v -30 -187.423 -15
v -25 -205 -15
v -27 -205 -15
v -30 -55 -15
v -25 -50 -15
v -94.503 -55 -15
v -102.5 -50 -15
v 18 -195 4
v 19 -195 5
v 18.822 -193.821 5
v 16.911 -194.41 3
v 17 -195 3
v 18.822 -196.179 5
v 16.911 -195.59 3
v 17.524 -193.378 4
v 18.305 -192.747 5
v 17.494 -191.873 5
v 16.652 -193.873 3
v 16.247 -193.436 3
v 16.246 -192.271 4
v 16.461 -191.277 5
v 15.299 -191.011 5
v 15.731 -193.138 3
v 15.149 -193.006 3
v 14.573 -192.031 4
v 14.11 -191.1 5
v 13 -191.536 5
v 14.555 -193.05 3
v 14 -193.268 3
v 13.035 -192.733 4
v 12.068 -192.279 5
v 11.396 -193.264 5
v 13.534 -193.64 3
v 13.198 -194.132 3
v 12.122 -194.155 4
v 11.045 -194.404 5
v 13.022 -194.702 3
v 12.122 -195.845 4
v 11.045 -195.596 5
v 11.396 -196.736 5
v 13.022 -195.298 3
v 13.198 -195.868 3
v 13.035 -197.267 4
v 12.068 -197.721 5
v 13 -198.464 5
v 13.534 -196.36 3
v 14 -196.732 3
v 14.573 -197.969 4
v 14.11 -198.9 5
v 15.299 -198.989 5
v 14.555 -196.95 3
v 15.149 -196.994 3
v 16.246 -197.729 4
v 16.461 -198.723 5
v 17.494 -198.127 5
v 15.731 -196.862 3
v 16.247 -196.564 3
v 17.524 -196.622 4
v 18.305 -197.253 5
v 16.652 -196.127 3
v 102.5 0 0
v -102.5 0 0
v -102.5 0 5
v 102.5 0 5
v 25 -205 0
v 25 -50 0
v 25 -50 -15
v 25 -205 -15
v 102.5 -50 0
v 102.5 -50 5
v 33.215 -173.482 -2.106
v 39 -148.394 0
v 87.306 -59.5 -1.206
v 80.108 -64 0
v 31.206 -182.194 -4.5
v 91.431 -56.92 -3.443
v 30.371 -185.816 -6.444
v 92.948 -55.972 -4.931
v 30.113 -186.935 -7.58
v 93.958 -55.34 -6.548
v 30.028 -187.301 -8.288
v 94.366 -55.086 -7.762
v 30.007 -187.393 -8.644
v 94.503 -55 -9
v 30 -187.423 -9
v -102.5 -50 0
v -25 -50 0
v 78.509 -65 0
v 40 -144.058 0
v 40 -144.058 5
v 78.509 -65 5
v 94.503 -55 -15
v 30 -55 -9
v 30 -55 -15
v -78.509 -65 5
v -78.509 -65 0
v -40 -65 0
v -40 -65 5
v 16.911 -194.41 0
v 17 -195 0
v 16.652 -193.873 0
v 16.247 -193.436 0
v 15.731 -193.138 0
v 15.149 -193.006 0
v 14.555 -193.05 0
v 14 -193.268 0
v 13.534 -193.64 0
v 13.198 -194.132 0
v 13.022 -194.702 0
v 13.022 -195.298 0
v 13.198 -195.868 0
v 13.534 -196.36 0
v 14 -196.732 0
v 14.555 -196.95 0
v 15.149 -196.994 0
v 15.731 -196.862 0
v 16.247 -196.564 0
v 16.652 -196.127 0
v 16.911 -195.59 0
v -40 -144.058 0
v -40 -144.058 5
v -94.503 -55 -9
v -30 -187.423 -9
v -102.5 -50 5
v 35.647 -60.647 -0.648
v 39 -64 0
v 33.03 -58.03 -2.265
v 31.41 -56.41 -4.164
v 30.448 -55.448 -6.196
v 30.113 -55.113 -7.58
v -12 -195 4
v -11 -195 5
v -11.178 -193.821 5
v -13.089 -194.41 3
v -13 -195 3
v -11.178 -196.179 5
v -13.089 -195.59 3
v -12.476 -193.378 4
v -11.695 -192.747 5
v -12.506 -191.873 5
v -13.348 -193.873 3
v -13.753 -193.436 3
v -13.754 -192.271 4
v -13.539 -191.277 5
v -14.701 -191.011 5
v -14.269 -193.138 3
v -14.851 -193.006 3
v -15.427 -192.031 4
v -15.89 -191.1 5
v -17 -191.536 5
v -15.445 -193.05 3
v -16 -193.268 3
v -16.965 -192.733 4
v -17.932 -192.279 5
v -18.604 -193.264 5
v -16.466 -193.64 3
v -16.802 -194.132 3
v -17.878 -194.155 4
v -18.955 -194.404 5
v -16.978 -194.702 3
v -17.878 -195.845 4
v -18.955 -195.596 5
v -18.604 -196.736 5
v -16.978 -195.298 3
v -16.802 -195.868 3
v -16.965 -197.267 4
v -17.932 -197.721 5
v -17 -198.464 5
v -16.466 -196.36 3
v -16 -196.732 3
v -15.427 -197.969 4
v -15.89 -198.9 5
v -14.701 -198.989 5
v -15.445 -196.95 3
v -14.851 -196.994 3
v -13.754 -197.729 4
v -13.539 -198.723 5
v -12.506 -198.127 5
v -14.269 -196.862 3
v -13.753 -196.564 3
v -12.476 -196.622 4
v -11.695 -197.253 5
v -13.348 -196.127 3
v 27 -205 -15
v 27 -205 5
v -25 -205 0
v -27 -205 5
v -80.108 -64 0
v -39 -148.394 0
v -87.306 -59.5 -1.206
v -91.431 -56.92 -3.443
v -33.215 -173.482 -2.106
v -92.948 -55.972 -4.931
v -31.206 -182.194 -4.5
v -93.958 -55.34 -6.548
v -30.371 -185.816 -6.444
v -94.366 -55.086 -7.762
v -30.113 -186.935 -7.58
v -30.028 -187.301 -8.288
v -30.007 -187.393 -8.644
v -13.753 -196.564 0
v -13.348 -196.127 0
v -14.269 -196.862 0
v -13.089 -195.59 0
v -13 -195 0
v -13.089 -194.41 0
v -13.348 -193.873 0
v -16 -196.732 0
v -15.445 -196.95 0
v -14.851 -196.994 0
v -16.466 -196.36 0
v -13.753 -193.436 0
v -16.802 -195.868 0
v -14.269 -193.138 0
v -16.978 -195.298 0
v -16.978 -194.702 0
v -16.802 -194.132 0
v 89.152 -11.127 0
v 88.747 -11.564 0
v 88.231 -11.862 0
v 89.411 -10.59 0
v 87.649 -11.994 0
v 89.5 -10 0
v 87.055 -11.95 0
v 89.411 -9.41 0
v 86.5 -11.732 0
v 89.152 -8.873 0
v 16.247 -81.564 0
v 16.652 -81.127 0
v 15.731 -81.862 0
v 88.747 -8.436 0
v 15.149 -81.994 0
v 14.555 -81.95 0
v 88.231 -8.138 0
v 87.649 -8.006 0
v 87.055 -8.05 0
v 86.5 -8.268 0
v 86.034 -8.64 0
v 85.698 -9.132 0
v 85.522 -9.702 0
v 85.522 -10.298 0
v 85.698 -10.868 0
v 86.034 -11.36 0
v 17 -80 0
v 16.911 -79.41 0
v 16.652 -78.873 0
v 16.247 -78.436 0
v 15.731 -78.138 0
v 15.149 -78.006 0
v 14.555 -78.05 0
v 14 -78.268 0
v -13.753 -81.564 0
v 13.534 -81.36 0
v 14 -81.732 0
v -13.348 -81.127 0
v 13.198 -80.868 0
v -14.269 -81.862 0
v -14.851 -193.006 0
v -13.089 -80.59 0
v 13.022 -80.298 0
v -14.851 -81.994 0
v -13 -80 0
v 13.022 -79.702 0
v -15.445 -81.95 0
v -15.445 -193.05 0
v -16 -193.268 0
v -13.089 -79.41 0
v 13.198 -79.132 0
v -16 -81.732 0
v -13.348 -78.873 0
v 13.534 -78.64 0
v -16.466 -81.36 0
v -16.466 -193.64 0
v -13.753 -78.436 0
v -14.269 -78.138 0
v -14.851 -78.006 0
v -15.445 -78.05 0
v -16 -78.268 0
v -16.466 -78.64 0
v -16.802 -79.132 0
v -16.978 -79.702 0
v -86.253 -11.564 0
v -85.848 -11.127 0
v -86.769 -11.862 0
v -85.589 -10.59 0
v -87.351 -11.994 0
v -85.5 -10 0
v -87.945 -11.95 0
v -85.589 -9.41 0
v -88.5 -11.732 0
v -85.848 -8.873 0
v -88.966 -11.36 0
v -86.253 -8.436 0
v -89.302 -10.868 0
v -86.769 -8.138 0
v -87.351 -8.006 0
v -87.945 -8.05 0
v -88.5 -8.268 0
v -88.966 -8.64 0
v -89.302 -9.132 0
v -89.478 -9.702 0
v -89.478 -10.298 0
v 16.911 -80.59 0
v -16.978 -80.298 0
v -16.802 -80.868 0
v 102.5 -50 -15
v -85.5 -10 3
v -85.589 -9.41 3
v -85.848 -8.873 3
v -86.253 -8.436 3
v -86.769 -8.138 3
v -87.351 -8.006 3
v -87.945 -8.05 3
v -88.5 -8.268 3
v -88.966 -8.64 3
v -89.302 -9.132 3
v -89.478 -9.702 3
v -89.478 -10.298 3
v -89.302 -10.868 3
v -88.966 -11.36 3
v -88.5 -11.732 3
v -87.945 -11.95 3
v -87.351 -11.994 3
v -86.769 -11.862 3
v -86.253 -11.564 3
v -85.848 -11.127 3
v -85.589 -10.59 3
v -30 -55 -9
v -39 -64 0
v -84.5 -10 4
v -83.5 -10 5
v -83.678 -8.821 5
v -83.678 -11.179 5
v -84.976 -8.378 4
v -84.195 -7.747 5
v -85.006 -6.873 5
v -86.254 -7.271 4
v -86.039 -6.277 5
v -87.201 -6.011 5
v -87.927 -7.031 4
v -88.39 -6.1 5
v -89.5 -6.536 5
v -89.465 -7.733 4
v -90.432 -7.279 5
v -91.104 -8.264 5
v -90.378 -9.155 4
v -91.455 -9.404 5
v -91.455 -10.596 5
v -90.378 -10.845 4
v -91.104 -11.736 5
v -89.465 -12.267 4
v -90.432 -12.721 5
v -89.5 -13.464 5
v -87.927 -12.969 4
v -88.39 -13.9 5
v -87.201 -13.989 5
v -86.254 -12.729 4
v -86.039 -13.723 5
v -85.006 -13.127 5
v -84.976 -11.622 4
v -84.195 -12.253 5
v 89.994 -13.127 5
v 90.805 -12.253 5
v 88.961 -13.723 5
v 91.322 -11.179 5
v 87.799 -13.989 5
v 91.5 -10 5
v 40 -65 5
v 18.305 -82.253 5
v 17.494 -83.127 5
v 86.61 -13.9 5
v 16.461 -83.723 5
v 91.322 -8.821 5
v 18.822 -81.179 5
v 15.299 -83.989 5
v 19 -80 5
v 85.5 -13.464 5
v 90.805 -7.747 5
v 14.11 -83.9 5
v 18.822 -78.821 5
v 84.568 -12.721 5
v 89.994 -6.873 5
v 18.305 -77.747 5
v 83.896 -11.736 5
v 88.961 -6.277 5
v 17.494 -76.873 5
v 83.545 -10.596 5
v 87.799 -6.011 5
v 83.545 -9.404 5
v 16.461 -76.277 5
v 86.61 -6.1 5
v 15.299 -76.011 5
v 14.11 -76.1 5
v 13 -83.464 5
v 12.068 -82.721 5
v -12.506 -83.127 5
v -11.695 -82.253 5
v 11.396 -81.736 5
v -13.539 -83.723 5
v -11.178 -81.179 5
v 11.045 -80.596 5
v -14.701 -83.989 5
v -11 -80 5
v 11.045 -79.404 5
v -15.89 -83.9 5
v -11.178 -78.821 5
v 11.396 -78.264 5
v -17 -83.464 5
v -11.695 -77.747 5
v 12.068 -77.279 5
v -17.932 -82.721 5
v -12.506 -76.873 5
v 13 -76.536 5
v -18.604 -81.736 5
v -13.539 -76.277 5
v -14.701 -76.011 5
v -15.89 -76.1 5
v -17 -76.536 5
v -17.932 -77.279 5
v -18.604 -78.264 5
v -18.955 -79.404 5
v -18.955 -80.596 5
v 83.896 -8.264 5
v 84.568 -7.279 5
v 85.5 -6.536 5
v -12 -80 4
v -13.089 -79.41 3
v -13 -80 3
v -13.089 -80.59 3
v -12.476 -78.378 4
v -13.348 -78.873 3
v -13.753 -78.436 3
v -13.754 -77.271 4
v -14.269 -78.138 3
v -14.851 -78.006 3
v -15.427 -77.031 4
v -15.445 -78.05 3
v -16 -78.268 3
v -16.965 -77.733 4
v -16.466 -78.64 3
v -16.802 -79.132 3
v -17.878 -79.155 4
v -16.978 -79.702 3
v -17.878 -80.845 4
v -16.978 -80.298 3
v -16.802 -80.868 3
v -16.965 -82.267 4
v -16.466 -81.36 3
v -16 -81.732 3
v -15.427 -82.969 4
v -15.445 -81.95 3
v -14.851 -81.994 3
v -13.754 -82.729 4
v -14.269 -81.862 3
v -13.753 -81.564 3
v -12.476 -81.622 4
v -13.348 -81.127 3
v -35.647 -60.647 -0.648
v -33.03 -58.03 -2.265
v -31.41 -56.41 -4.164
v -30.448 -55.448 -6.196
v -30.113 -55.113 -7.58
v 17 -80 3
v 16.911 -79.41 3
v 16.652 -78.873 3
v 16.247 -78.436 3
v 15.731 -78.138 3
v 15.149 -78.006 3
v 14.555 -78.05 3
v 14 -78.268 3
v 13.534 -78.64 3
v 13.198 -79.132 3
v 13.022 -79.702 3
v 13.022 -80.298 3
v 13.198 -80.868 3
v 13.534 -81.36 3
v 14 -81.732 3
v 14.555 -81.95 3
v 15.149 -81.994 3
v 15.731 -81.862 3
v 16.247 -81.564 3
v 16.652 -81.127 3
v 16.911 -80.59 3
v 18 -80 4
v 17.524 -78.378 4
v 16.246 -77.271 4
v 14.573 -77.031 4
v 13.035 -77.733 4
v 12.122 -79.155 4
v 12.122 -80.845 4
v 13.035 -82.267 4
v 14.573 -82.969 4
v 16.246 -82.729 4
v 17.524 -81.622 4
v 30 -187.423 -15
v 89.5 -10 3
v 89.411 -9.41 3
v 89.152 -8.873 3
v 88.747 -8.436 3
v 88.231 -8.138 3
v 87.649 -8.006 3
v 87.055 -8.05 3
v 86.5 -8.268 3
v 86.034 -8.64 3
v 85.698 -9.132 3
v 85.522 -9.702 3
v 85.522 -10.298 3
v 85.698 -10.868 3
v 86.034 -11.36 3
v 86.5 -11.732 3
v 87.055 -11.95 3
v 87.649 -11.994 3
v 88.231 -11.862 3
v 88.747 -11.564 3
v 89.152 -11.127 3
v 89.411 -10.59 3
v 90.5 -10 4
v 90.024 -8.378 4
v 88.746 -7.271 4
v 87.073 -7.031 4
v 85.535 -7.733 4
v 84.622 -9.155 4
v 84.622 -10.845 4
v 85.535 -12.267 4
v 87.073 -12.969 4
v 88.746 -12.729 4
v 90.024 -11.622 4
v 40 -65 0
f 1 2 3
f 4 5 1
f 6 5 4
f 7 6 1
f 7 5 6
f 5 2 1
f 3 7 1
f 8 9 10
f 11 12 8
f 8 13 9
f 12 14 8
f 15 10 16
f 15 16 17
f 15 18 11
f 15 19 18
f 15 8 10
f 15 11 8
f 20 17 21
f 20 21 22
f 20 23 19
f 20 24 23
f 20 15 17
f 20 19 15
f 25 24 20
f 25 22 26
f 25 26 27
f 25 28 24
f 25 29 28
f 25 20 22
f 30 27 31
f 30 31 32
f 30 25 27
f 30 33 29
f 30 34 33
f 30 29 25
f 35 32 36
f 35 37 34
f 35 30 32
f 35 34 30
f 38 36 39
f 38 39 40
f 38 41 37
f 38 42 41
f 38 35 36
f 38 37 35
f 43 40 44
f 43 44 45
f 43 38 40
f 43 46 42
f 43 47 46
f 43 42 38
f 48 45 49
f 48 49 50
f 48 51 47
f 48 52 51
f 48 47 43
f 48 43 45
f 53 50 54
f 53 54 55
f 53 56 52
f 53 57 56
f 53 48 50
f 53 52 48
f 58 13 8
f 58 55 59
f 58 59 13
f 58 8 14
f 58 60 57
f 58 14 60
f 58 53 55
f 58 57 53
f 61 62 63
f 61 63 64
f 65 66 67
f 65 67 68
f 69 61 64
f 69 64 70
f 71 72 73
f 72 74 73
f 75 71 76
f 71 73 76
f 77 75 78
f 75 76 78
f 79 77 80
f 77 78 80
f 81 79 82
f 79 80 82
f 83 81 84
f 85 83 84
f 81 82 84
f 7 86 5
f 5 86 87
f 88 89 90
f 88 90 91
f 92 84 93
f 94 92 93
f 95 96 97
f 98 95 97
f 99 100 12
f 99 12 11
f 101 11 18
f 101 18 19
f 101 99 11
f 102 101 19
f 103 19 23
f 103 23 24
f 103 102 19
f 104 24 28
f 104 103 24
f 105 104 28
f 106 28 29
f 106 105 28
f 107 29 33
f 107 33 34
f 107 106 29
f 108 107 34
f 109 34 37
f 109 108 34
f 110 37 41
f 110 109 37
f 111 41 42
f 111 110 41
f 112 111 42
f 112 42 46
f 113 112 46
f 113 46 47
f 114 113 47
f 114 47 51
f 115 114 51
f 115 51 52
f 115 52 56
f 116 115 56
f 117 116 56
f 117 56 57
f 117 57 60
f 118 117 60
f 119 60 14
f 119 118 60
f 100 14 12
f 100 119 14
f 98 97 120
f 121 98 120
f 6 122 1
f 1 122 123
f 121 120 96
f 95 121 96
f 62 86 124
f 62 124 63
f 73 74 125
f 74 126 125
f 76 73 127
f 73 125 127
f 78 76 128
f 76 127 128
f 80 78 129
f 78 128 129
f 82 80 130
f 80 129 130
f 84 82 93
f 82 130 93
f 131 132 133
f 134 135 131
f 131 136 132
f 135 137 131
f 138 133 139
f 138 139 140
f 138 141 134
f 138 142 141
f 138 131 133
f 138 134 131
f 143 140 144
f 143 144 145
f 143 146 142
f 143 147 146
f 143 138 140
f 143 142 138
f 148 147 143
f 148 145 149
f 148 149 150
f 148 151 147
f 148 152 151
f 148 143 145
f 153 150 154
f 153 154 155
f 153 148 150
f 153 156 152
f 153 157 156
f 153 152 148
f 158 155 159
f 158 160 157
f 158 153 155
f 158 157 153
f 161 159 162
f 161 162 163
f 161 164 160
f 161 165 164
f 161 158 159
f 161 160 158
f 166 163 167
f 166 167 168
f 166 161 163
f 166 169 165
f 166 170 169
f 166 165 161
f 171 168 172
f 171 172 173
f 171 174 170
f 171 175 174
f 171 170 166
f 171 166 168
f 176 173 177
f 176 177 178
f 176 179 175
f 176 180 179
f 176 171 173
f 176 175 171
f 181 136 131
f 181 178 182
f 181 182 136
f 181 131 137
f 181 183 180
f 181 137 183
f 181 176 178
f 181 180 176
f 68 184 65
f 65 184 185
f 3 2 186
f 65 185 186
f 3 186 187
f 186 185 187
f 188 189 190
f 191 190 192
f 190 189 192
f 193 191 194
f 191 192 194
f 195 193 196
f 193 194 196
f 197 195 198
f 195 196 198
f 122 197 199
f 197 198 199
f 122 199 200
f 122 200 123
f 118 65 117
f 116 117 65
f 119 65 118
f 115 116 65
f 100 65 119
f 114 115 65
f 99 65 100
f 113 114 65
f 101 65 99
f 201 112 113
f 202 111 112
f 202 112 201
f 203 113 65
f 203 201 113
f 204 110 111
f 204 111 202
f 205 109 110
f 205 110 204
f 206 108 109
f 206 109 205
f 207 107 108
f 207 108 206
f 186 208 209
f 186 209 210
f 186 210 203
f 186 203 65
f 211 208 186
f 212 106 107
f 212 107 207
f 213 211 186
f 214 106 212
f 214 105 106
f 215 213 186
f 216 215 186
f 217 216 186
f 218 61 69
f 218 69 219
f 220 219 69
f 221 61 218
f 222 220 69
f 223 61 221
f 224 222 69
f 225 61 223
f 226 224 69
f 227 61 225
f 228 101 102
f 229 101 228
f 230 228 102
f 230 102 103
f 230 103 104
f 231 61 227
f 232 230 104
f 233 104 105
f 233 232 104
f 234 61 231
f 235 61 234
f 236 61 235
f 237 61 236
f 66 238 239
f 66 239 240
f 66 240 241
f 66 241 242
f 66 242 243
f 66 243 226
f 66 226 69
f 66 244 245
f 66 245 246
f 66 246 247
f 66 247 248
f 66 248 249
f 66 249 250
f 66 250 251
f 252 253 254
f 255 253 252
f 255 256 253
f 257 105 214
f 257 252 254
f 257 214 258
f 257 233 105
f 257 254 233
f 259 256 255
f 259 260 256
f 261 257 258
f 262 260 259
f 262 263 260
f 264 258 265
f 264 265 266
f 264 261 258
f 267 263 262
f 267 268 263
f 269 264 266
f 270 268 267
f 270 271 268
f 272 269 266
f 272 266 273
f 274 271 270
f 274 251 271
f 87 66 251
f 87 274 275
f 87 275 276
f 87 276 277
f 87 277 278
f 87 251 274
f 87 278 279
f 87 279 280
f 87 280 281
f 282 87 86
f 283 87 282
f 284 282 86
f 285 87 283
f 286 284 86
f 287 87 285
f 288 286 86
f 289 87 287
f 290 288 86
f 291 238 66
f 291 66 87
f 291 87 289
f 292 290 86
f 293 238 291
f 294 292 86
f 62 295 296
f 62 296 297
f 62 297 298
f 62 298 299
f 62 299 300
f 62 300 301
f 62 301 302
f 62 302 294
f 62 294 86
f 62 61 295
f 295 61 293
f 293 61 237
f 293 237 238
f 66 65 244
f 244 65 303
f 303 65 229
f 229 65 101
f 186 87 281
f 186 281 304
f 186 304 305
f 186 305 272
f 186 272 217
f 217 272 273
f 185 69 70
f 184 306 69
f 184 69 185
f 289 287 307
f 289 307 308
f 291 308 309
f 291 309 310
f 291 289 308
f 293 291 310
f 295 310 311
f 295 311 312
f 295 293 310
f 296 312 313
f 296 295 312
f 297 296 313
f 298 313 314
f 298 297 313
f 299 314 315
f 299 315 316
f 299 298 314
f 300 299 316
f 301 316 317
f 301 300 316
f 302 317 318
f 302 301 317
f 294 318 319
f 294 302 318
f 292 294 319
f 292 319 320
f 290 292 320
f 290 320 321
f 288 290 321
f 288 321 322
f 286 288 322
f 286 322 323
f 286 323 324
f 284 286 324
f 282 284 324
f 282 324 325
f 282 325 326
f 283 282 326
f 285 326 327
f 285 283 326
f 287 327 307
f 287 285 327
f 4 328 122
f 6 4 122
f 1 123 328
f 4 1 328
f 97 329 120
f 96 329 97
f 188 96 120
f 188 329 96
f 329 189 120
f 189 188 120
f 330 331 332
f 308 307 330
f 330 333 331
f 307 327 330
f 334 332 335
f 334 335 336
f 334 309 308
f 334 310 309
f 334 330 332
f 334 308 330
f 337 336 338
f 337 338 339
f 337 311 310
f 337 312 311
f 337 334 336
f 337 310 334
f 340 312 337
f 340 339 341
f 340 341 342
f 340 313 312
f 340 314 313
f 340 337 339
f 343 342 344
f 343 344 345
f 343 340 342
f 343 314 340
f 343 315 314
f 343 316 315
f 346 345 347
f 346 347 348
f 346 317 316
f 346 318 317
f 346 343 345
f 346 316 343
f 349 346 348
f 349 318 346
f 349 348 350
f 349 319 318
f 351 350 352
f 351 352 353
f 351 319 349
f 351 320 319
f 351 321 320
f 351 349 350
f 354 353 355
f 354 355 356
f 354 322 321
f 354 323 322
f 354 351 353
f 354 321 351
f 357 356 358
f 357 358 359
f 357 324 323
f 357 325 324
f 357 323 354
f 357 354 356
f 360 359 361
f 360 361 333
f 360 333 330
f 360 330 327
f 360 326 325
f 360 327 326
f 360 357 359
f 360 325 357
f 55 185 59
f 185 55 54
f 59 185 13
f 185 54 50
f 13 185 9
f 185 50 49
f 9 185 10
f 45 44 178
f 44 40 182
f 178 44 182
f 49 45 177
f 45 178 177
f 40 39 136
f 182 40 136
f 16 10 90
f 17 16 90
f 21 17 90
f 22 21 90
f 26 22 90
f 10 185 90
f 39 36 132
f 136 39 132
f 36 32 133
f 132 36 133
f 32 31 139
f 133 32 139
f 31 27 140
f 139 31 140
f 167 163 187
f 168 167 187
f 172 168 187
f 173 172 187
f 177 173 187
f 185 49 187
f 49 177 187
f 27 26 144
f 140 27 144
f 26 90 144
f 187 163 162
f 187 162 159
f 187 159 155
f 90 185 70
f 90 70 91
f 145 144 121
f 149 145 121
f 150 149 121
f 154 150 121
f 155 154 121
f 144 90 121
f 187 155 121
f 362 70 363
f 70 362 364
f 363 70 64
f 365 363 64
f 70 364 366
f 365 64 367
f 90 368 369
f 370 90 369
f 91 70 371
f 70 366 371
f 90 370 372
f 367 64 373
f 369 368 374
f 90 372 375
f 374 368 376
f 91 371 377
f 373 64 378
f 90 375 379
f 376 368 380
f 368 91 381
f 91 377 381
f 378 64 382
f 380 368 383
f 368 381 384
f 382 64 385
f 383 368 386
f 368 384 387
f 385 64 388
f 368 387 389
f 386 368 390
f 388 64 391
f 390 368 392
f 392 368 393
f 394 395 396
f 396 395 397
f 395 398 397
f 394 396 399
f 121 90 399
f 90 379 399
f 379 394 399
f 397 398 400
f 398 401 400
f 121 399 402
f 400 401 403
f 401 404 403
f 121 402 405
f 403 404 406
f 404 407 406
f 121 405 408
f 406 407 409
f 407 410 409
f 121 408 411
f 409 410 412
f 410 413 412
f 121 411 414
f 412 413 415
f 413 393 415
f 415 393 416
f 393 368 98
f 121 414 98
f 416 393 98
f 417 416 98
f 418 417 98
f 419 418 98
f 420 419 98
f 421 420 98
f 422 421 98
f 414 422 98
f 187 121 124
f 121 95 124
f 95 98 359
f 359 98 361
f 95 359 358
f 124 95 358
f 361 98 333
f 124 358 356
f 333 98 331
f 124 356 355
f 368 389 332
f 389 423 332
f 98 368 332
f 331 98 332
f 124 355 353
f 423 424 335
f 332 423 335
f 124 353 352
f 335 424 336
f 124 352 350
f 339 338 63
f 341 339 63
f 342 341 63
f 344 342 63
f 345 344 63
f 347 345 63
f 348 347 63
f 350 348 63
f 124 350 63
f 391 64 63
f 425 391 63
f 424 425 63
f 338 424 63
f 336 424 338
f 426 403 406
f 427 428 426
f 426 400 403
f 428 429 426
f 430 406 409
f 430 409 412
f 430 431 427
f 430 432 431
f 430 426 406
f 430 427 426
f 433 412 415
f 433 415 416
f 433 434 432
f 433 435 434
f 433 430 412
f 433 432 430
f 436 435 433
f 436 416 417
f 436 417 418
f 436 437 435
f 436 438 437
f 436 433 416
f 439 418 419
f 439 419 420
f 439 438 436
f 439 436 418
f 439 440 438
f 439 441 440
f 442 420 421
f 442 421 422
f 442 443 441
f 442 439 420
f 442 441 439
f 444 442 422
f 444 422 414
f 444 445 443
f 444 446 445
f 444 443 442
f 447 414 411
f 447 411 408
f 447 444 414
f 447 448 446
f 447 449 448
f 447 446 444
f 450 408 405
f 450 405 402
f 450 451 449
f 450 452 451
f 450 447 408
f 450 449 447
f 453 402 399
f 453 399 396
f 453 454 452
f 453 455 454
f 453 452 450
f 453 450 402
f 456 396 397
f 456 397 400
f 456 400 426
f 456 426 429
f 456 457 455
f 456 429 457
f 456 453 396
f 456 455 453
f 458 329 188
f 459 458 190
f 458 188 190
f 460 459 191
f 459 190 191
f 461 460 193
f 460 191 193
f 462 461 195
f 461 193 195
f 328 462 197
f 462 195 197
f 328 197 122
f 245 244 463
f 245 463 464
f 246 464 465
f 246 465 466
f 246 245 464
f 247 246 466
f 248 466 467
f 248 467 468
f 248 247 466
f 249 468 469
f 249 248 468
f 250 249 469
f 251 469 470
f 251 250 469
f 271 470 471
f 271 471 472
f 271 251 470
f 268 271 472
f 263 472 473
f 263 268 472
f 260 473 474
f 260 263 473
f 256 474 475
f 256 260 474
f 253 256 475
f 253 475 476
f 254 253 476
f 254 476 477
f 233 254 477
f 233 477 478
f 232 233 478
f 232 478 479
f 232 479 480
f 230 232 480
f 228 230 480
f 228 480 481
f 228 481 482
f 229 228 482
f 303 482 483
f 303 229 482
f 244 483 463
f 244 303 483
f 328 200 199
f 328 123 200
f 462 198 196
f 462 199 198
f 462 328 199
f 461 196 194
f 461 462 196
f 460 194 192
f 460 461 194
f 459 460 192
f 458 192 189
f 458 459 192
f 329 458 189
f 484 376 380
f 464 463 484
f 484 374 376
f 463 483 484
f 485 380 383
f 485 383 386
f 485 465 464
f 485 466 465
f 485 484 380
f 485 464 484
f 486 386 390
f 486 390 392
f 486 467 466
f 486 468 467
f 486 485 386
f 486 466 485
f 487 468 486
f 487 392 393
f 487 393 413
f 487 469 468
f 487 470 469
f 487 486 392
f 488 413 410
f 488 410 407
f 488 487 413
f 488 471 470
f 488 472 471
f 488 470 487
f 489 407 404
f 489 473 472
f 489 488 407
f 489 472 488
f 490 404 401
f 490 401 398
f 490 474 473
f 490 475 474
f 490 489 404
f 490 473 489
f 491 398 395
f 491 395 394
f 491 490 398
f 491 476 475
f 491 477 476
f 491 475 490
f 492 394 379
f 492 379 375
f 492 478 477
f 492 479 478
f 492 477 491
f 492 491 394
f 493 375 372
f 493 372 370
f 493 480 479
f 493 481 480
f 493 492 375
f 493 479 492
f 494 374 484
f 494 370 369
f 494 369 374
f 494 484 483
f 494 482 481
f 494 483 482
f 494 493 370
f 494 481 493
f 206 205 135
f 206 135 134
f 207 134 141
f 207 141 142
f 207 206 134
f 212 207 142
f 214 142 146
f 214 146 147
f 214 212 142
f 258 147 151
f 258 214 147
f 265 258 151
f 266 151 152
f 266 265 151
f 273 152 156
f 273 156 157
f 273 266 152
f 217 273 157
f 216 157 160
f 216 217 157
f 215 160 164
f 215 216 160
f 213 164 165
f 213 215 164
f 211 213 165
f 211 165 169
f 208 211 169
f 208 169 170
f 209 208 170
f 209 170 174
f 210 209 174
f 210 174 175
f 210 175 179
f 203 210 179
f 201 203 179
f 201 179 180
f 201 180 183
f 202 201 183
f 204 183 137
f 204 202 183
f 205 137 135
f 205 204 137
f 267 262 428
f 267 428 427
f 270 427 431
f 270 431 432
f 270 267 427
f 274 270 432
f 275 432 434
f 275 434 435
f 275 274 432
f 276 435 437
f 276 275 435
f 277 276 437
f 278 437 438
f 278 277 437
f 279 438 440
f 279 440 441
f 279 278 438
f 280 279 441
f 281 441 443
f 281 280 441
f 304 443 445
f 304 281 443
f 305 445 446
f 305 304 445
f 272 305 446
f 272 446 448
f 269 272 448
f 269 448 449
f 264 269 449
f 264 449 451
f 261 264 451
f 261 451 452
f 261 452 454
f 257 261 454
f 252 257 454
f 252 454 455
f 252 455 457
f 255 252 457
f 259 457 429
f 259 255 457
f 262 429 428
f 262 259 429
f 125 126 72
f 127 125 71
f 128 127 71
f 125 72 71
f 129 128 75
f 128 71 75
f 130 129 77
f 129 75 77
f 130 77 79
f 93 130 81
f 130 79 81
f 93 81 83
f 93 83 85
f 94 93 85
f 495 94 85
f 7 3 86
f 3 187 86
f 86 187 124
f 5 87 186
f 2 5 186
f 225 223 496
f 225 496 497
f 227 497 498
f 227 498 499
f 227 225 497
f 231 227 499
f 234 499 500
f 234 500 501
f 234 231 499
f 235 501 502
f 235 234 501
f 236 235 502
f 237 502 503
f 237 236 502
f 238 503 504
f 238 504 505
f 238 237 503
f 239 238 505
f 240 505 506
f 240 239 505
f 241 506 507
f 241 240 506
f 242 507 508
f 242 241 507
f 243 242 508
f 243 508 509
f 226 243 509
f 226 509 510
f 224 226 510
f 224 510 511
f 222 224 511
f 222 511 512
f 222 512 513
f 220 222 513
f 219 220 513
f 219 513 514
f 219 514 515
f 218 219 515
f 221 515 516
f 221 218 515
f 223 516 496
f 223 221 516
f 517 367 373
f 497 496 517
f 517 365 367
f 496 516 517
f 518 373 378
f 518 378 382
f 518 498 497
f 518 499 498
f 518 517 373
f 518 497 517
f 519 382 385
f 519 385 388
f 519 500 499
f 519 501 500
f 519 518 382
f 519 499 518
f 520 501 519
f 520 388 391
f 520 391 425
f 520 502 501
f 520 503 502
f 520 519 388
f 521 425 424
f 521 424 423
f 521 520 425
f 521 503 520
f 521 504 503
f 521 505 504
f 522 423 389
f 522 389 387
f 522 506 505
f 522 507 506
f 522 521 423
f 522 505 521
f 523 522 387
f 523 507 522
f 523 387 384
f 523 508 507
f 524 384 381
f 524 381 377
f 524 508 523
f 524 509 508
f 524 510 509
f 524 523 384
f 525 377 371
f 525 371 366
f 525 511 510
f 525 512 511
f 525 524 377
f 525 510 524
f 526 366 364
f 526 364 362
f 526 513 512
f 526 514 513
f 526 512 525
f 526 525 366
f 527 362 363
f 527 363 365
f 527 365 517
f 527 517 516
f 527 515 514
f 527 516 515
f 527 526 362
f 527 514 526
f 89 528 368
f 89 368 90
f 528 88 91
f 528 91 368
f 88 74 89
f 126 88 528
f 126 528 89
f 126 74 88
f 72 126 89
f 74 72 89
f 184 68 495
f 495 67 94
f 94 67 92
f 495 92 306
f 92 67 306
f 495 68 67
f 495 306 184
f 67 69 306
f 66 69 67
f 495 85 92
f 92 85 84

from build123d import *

# Parameters (mm, degrees)
SKETCH019_R     = 2
PAD_DEPTH       = 5
PAD001_DEPTH    = 15
FILLET003_R     = 9
CHAMFER004_SIZE = 2


with BuildPart() as part:
    # Sketch019 → Pad (new body)
    with BuildSketch(Plane.XY):
        Polygon((-102.5, 0), (102.5, 0), (102.5, -50), (27, -205), (-27, -205), (-102.5, -50), align=None)
        with Locations((-87.5, -10)):
            Circle(SKETCH019_R, mode=Mode.SUBTRACT)
        with Locations((87.5, -10)):
            Circle(SKETCH019_R, mode=Mode.SUBTRACT)
        with Locations((-15, -80)):
            Circle(SKETCH019_R, mode=Mode.SUBTRACT)
        with Locations((15, -80)):
            Circle(SKETCH019_R, mode=Mode.SUBTRACT)
        with Locations((-15, -195)):
            Circle(SKETCH019_R, mode=Mode.SUBTRACT)
        with Locations((15, -195)):
            Circle(SKETCH019_R, mode=Mode.SUBTRACT)
        Polygon((-78.508698, -65), (-40, -65), (-40, -144.057592), align=None, mode=Mode.SUBTRACT)
        Polygon((78.508698, -65), (40, -65), (40, -144.057592), align=None, mode=Mode.SUBTRACT)
    extrude(amount=PAD_DEPTH)

    # Sketch020 → Pad001 (join)
    with BuildSketch(Plane.XY):
        Polygon((-25, -50), (-25, -205), (-27, -205), (-102.5, -50), align=None)
        Polygon((-30, -187.423171), (-30, -55), (-94.502899, -55), align=None, mode=Mode.SUBTRACT)
        Polygon((25, -50), (25, -205), (27, -205), (102.5, -50), align=None)
        Polygon((94.502899, -55), (30, -55), (30, -187.423171), align=None, mode=Mode.SUBTRACT)
    extrude(amount=-PAD001_DEPTH)

    # Fillet003
    fillet003_edges = [part.edges().sort_by_distance(p)[0] for p in [
        (30, -121.211585, 0),
        (-62.25145, -55, 0),
        (-62.25145, -121.211585, 0),
        (62.25145, -55, 0),
        (62.25145, -121.211585, 0),
        (-30, -121.211585, 0),
    ]]
    fillet(fillet003_edges, radius=FILLET003_R)

    # Chamfer004
    chamfer004_edges = [part.edges().sort_by_distance(p)[0] for p in [
        (-89.5, -10, 5),
        (85.5, -10, 5),
        (-17, -80, 5),
        (13, -80, 5),
        (-17, -195, 5),
        (13, -195, 5),
    ]]
    chamfer(chamfer004_edges, length=CHAMFER004_SIZE)


solid = part.part
